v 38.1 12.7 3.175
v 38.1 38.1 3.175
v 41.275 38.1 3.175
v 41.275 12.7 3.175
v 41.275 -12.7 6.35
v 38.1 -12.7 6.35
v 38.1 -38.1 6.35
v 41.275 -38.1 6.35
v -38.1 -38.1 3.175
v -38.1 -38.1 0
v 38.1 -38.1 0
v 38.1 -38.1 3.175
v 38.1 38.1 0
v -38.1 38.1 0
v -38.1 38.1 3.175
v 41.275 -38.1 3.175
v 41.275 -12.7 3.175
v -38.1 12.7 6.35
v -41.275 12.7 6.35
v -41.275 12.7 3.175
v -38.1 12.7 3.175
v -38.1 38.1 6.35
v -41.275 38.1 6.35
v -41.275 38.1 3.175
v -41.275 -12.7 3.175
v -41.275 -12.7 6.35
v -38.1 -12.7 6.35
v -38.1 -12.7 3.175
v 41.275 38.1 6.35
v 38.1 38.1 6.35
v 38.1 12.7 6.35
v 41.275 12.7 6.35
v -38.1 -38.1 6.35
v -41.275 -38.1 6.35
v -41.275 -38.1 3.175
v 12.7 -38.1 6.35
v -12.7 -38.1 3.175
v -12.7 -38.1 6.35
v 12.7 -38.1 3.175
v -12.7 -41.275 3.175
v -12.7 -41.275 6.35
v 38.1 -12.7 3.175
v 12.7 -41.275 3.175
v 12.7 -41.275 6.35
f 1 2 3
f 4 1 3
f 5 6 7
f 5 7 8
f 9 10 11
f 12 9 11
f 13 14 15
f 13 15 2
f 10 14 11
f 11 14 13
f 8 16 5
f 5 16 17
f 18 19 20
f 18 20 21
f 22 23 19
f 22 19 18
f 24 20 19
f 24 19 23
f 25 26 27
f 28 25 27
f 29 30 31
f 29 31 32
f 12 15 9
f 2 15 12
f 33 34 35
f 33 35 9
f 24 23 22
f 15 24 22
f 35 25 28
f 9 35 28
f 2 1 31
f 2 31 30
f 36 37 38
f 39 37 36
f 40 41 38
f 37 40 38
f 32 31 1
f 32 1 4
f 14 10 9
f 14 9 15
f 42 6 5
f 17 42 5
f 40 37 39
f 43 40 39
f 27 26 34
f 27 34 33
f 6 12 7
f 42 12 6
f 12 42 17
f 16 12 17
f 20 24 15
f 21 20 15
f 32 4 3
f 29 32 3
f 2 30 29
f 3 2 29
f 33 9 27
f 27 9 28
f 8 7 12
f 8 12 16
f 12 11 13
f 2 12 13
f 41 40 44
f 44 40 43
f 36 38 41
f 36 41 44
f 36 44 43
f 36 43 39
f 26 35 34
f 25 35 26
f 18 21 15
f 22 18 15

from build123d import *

# Parameters (mm, degrees)
SKETCH2_W             = 76.2
SKETCH2_H             = 76.2
BOSS_EXTRUDE1_DEPTH   = 3.175
SKETCH4_W             = 3.175
SKETCH4_H             = 25.4
BOSS_EXTRUDE2_DEPTH   = 3.175
BOSS_EXTRUDE2_2_DEPTH = 3.175
SKETCH4_W_2           = 25.4
SKETCH4_H_2           = 3.175
BOSS_EXTRUDE2_3_DEPTH = 3.175
BOSS_EXTRUDE2_4_DEPTH = 3.175
BOSS_EXTRUDE2_5_DEPTH = 3.175


with BuildPart() as part:
    # Sketch2 → Boss-Extrude1 (new body)
    with BuildSketch(Plane.XY):
        Rectangle(SKETCH2_W, SKETCH2_H)
    extrude(amount=BOSS_EXTRUDE1_DEPTH)


with BuildPart() as body_2:
    # Sketch4 → Boss-Extrude2 (new body)
    with BuildSketch(Plane.XY.offset(3.175)):
        with Locations((-39.6875, 25.4)):
            Rectangle(SKETCH4_W, SKETCH4_H)
    extrude(amount=BOSS_EXTRUDE2_DEPTH)


with BuildPart() as body_3:
    # Sketch4 → Boss-Extrude2 2 (new body)
    with BuildSketch(Plane.XY.offset(3.175)):
        with Locations((-39.6875, -25.4)):
            Rectangle(SKETCH4_W, SKETCH4_H)
    extrude(amount=BOSS_EXTRUDE2_2_DEPTH)


with BuildPart() as body_4:
    # Sketch4 → Boss-Extrude2 3 (new body)
    with BuildSketch(Plane.XY.offset(3.175)):
        with Locations((0, -39.6875)):
            Rectangle(SKETCH4_W_2, SKETCH4_H_2)
    extrude(amount=BOSS_EXTRUDE2_3_DEPTH)


with BuildPart() as body_5:
    # Sketch4 → Boss-Extrude2 4 (new body)
    with BuildSketch(Plane.XY.offset(3.175)):
        with Locations((39.6875, 25.4)):
            Rectangle(SKETCH4_W, SKETCH4_H)
    extrude(amount=BOSS_EXTRUDE2_4_DEPTH)


with BuildPart() as body_6:
    # Sketch4 → Boss-Extrude2 5 (new body)
    with BuildSketch(Plane.XY.offset(3.175)):
        with Locations((39.6875, -25.4)):
            Rectangle(SKETCH4_W, SKETCH4_H)
    extrude(amount=BOSS_EXTRUDE2_5_DEPTH)


solid = Compound([part.part, body_2.part, body_3.part, body_4.part, body_5.part, body_6.part])
